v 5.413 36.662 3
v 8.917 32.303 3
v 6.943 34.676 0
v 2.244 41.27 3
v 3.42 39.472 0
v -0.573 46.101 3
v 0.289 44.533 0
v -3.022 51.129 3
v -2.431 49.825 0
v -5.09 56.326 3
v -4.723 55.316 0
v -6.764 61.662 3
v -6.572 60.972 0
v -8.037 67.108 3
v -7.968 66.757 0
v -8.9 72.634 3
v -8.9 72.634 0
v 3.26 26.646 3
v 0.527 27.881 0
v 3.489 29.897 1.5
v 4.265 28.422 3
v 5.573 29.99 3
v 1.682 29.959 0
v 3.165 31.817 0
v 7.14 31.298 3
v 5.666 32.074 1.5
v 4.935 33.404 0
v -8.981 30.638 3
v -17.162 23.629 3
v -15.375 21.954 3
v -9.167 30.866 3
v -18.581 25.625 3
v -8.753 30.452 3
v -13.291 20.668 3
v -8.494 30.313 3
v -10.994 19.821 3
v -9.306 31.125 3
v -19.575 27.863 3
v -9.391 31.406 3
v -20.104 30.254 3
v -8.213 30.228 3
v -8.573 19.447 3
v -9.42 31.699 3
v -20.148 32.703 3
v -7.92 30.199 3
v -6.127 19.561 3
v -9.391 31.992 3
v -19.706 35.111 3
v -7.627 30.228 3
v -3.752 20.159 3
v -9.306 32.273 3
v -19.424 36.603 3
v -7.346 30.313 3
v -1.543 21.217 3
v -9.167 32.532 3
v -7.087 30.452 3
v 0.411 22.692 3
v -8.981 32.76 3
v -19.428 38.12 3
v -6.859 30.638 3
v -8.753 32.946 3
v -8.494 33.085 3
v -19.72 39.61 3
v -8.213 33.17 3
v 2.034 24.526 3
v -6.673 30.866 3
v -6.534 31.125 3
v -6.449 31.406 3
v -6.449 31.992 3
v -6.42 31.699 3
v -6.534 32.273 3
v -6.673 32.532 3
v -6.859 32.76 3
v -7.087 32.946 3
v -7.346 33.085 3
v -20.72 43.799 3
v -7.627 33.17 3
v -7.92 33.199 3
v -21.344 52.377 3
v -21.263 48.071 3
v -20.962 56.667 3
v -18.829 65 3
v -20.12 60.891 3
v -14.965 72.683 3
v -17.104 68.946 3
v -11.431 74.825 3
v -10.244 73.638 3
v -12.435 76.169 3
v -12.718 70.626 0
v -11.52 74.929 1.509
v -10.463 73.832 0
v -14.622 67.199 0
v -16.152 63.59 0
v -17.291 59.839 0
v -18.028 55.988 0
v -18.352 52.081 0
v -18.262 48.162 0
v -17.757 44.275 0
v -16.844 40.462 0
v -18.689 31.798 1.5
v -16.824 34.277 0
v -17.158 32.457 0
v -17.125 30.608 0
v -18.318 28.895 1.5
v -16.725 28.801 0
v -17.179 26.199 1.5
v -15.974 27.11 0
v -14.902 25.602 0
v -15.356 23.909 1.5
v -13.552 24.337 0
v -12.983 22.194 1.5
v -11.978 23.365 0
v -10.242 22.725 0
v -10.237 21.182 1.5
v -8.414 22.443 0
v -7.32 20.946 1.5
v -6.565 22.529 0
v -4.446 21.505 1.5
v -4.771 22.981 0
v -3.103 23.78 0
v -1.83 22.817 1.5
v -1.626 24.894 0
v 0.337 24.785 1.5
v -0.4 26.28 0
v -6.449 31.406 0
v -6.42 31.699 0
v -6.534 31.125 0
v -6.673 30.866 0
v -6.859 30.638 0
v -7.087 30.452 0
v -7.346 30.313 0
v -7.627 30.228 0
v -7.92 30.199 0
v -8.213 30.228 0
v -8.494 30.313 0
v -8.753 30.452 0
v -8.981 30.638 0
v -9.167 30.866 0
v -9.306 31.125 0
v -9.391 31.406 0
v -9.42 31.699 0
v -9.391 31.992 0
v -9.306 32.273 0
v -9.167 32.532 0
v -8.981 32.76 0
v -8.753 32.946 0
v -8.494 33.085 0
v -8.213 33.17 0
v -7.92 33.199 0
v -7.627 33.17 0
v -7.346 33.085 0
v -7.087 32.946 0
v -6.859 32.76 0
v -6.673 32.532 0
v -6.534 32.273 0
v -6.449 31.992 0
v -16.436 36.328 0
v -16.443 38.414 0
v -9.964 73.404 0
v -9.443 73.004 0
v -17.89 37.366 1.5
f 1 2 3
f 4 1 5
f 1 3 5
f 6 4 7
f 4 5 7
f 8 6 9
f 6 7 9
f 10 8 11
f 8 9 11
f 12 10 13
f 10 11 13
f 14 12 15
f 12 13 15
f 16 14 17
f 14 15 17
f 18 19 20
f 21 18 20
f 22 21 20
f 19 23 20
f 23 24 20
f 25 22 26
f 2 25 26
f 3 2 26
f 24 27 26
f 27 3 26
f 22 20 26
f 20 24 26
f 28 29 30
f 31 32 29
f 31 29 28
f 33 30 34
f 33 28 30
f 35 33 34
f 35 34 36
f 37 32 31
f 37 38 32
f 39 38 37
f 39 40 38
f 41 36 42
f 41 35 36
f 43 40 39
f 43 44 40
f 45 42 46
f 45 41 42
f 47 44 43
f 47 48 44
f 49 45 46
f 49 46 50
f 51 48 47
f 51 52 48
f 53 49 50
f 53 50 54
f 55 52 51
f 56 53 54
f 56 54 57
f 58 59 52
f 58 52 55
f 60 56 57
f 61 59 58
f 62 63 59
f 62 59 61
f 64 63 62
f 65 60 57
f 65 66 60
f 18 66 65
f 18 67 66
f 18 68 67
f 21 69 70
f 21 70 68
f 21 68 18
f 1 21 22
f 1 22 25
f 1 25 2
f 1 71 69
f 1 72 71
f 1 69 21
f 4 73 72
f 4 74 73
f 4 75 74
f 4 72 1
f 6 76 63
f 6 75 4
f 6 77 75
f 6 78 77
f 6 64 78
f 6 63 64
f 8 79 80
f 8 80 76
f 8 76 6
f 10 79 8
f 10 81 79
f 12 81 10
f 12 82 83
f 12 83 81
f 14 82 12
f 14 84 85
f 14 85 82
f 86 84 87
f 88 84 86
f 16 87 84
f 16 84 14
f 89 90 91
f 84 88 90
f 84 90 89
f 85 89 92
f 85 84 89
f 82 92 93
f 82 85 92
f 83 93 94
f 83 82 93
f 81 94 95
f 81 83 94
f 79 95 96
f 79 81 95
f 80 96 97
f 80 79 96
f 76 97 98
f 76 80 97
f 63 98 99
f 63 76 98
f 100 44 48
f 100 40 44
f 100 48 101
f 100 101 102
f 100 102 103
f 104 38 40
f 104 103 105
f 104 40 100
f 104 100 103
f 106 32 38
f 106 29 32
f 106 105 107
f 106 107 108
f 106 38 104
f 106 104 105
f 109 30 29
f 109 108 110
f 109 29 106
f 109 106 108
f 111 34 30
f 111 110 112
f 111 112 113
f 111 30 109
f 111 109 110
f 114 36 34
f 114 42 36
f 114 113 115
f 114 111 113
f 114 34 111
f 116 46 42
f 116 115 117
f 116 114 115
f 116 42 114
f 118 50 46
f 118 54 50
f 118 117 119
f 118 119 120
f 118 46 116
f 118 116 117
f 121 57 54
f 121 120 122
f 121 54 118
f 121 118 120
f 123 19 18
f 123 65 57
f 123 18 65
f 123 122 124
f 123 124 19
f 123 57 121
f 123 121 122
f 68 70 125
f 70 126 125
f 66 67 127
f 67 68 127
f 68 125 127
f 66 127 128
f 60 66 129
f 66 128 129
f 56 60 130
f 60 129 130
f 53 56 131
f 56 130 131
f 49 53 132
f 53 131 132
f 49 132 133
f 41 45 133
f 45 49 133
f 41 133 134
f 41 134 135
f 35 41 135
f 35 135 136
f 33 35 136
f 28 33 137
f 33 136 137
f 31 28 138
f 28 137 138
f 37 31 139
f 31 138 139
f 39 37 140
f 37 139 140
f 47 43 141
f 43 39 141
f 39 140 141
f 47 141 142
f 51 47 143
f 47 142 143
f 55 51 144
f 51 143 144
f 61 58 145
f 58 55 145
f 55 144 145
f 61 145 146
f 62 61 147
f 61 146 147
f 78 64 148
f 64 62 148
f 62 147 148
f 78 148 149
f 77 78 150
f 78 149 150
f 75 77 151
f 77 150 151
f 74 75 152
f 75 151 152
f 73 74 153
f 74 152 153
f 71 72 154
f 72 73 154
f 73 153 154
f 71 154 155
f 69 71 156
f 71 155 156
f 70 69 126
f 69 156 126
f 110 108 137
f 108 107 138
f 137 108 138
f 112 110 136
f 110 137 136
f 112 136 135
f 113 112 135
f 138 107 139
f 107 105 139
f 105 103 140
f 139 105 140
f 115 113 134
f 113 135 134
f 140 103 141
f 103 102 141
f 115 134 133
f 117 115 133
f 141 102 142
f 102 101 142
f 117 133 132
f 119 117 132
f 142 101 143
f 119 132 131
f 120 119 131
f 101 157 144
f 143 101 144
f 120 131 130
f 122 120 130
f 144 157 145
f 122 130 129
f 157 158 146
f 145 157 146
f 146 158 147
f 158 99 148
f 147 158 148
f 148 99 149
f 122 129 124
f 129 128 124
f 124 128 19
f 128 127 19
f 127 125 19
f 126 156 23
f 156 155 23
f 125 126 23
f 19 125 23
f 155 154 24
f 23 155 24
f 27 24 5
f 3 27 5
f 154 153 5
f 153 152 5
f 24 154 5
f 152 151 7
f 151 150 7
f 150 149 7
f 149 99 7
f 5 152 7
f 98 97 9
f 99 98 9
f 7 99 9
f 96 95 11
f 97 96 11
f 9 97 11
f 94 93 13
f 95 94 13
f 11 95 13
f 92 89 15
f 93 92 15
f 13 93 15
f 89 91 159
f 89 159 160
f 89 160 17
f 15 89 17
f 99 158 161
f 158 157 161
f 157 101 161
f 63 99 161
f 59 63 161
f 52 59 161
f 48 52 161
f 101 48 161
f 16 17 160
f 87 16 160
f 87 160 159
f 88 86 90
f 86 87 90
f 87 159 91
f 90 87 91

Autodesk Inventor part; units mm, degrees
ref_plane "YZ Plane" through (0, 0, 0) normal (1, 0, 0) x (0, 1, 0)
ref_plane "XZ Plane" through (0, 0, 0) normal (0, 1, 0) x (-1, 0, 0)
ref_plane "XY Plane" through (0, 0, 0) normal (0, 0, 1) x (1, 0, 0)
sketch "Sketch1" plane through (0, 0, 0) normal (0, 0, 1) x (1, 0, 0)
  arc A0 (-12.435485, 76.169317) -> (-19.719816, 39.609757) centre (18.622974, 50.975591) ccw
  arc A1 (-12.435485, 76.169317) -> (-8.899951, 72.633783) centre (-2.589145, 82.480123) ccw
  line L0 (-12.435485, 76.169317) -> (-8.899951, 72.633783) construction
  line L1 (-12.435485, 76.169317) -> (-7.435485, 76.169317) construction
  arc A2 (-8.899951, 72.633783) -> (8.917299, 32.302519) centre (65.581671, 81.436509) ccw
  arc A3 (8.917299, 32.302519) -> (3.260445, 26.645665) centre (13.582916, 21.980048) ccw
  line L2 (8.917299, 32.302519) -> (3.260445, 26.645665) construction
  line L3 (8.917299, 32.302519) -> (16.917299, 32.302519) construction
  arc A4 (-19.70552, 35.111295) -> (3.260445, 26.645665) centre (-7.920046, 31.699095) ccw
  arc A5 (-19.70552, 35.111295) -> (-19.719816, 39.609757) centre (-27.389927, 37.336129) ccw
  circle A6 centre (-7.920046, 31.699095) radius 1.5
  line L4 (-21.368921, 76.169317) -> (8.917299, 76.169317)
  line L5 (8.917299, 76.169317) -> (8.917299, 19.429599)
  line L6 (8.917299, 19.429599) -> (-21.368921, 19.429599)
  line L7 (-21.368921, 19.429599) -> (-21.368921, 76.169317)
  line L8 (-21.368921, 39.609757) -> (3.327974, 39.609757)
  line L9 (-19.719816, 39.609757) -> (3.327974, 39.609757) construction
  line L10 (3.327974, 39.609757) -> (3.327974, 76.169317)
  line L11 (3.327974, 39.609757) -> (39.887534, 39.609757) construction
  dimension "d25" = 39.9919
  dimension "d26" = 5
  dimension "d27" = 45
  dimension "d28" = 75
  dimension "d29" = 8
  dimension "d30" = 135
  dimension "d31" = 8
  dimension "d32" = 3
  dimension "d51" = 0
  dimension "d52" = 90
sketch "Sketch1 outline for Extrusion1" plane through (0, 0, 0) normal (0, 0, 1) x (1, 0, 0)
  arc A0 (-8.899951, 72.633783) -> (-12.435485, 76.169317) centre (-2.589145, 82.480123) cw
  arc A1 (8.917299, 32.302519) -> (-8.899951, 72.633783) centre (65.581671, 81.436509) cw
  arc A2 (-12.435485, 76.169317) -> (-19.719816, 39.609757) centre (18.622974, 50.975591) ccw
  arc A3 (3.260445, 26.645665) -> (8.917299, 32.302519) centre (13.582916, 21.980048) cw
  arc A4 (-19.719816, 39.609757) -> (-19.70552, 35.111295) centre (-27.389927, 37.336129) cw
  arc A5 (-19.70552, 35.111295) -> (3.260445, 26.645665) centre (-7.920046, 31.699095) ccw
  circle A6 centre (-7.920046, 31.699095) radius 1.5
extrude "Extrusion1" add sketch "Sketch1 outline for Extrusion1" along normal blind 3
sketch "Sketch2" plane through (0, 0, 0) normal (0, 0, -1) x (-1, 0, 0)
  arc A0 (8.899951, 72.633783) -> (12.435485, 76.169317) centre (2.589145, 82.480123) ccw
  arc A1 (19.719816, 39.609757) -> (12.435485, 76.169317) centre (-18.622974, 50.975591) ccw
  arc A2 (-8.917299, 32.302519) -> (8.899951, 72.633783) centre (-65.581671, 81.436509) ccw
  arc A3 (19.719816, 39.609757) -> (19.70552, 35.111295) centre (27.389927, 37.336129) ccw
  line L0 (19.719816, 39.609757) -> (0.192482, 45.398184)
  arc A4 (11.216243, 74.583931) -> (12.435485, 76.169317) centre (2.589145, 82.480123) ccw
  arc A5 (9.327537, 42.690308) -> (11.216243, 74.583931) centre (-26.326768, 60.804454) ccw
  point P0 (0, 0)
  dimension "d35" = 0
  dimension "d37" = 2
sketch "Sketch2 outline for Extrusion2" plane through (0, 0, 0) normal (0, 0, -1) x (-1, 0, 0)
  arc A0 (19.719816, 39.609757) -> (12.435485, 76.169317) centre (-18.622974, 50.975591) ccw
  line L0 (9.327537, 42.690308) -> (19.719816, 39.609757)
  arc A1 (11.216243, 74.583931) -> (9.327537, 42.690308) centre (-26.326768, 60.804454) cw
  arc A2 (12.435485, 76.169317) -> (11.216243, 74.583931) centre (2.589145, 82.480123) cw
extrude "Extrusion2" add sketch "Sketch2 outline for Extrusion2" against normal blind 3
sketch "Sketch5" plane through (0, 0, 3) normal (0, 0, 1) x (1, 0, 0)
  line L0 (-9.327537, 42.690308) -> (-19.719816, 39.609757)
  line L1 (-9.327537, 42.690308) -> (-9.327537, 72.921318)
  arc A0 (-12.435485, 76.169317) -> (-8.899951, 72.633783) centre (-2.589145, 82.480123) ccw
  line L2 (-9.327537, 42.690308) -> (20.903473, 42.690308) construction
  line L3 (-19.719816, 39.609757) -> (-9.327537, 39.609757)
  line L4 (-19.719816, 39.609757) -> (-9.327537, 39.609757) construction
  line L5 (-9.327537, 39.609757) -> (-9.327537, 42.690308)
  line L6 (-21.368921, 76.169317) -> (-21.368921, 42.690308)
  arc A1 (-12.435485, 76.169317) -> (-19.719816, 39.609757) centre (18.622974, 50.975591) ccw
  line L7 (-19.719816, 39.609757) -> (-21.368921, 39.609757)
  line L8 (-21.368921, 39.609757) -> (-21.368921, 43.268072)
  line L9 (-21.368921, 76.169317) -> (-9.327537, 76.169317)
  line L10 (-9.327537, 72.921318) -> (-9.327537, 76.169317)
  point P0 (0, 0)
  point P1 (-11.216243, 74.583931)
  point P2 (-21.368921, 50.975591)
  dimension "d47" = 90
  dimension "d48" = 0
sketch "Sketch6" plane through (0, 0, 3) normal (0, 0, 1) x (-1, 0, 0)
  line L0 (21.368921, -76.169317) -> (21.368921, -42.690308)
  arc A0 (19.719816, 39.609757) -> (12.435485, 76.169317) centre (-18.622974, 50.975591) ccw
  point P0 (0, 0)
  point P1 (21.368921, 50.975591)
ref_plane "Work Plane3" through (-9.327537, 76.169317, 3) normal (0, 0, -1) x (0, -1, 0)
extrude "Extrusion3" [suppressed]
draft "FaceDraft7" angle 45 pull direction (0, 0, -1) faces at (-13.99815, 74.110283, 1) (-19.580116, 35.602105, 2) (0.992604, 23.266705, 2) (3.667398, 27.457629, 1) fixed edges at (-20.597986, 58.790194, 3) (-19.389968, 37.361551, 3) (-12.163655, 20.186828, 3) (5.572879, 29.990085, 3)
properties part number "Hoja de Corte"
